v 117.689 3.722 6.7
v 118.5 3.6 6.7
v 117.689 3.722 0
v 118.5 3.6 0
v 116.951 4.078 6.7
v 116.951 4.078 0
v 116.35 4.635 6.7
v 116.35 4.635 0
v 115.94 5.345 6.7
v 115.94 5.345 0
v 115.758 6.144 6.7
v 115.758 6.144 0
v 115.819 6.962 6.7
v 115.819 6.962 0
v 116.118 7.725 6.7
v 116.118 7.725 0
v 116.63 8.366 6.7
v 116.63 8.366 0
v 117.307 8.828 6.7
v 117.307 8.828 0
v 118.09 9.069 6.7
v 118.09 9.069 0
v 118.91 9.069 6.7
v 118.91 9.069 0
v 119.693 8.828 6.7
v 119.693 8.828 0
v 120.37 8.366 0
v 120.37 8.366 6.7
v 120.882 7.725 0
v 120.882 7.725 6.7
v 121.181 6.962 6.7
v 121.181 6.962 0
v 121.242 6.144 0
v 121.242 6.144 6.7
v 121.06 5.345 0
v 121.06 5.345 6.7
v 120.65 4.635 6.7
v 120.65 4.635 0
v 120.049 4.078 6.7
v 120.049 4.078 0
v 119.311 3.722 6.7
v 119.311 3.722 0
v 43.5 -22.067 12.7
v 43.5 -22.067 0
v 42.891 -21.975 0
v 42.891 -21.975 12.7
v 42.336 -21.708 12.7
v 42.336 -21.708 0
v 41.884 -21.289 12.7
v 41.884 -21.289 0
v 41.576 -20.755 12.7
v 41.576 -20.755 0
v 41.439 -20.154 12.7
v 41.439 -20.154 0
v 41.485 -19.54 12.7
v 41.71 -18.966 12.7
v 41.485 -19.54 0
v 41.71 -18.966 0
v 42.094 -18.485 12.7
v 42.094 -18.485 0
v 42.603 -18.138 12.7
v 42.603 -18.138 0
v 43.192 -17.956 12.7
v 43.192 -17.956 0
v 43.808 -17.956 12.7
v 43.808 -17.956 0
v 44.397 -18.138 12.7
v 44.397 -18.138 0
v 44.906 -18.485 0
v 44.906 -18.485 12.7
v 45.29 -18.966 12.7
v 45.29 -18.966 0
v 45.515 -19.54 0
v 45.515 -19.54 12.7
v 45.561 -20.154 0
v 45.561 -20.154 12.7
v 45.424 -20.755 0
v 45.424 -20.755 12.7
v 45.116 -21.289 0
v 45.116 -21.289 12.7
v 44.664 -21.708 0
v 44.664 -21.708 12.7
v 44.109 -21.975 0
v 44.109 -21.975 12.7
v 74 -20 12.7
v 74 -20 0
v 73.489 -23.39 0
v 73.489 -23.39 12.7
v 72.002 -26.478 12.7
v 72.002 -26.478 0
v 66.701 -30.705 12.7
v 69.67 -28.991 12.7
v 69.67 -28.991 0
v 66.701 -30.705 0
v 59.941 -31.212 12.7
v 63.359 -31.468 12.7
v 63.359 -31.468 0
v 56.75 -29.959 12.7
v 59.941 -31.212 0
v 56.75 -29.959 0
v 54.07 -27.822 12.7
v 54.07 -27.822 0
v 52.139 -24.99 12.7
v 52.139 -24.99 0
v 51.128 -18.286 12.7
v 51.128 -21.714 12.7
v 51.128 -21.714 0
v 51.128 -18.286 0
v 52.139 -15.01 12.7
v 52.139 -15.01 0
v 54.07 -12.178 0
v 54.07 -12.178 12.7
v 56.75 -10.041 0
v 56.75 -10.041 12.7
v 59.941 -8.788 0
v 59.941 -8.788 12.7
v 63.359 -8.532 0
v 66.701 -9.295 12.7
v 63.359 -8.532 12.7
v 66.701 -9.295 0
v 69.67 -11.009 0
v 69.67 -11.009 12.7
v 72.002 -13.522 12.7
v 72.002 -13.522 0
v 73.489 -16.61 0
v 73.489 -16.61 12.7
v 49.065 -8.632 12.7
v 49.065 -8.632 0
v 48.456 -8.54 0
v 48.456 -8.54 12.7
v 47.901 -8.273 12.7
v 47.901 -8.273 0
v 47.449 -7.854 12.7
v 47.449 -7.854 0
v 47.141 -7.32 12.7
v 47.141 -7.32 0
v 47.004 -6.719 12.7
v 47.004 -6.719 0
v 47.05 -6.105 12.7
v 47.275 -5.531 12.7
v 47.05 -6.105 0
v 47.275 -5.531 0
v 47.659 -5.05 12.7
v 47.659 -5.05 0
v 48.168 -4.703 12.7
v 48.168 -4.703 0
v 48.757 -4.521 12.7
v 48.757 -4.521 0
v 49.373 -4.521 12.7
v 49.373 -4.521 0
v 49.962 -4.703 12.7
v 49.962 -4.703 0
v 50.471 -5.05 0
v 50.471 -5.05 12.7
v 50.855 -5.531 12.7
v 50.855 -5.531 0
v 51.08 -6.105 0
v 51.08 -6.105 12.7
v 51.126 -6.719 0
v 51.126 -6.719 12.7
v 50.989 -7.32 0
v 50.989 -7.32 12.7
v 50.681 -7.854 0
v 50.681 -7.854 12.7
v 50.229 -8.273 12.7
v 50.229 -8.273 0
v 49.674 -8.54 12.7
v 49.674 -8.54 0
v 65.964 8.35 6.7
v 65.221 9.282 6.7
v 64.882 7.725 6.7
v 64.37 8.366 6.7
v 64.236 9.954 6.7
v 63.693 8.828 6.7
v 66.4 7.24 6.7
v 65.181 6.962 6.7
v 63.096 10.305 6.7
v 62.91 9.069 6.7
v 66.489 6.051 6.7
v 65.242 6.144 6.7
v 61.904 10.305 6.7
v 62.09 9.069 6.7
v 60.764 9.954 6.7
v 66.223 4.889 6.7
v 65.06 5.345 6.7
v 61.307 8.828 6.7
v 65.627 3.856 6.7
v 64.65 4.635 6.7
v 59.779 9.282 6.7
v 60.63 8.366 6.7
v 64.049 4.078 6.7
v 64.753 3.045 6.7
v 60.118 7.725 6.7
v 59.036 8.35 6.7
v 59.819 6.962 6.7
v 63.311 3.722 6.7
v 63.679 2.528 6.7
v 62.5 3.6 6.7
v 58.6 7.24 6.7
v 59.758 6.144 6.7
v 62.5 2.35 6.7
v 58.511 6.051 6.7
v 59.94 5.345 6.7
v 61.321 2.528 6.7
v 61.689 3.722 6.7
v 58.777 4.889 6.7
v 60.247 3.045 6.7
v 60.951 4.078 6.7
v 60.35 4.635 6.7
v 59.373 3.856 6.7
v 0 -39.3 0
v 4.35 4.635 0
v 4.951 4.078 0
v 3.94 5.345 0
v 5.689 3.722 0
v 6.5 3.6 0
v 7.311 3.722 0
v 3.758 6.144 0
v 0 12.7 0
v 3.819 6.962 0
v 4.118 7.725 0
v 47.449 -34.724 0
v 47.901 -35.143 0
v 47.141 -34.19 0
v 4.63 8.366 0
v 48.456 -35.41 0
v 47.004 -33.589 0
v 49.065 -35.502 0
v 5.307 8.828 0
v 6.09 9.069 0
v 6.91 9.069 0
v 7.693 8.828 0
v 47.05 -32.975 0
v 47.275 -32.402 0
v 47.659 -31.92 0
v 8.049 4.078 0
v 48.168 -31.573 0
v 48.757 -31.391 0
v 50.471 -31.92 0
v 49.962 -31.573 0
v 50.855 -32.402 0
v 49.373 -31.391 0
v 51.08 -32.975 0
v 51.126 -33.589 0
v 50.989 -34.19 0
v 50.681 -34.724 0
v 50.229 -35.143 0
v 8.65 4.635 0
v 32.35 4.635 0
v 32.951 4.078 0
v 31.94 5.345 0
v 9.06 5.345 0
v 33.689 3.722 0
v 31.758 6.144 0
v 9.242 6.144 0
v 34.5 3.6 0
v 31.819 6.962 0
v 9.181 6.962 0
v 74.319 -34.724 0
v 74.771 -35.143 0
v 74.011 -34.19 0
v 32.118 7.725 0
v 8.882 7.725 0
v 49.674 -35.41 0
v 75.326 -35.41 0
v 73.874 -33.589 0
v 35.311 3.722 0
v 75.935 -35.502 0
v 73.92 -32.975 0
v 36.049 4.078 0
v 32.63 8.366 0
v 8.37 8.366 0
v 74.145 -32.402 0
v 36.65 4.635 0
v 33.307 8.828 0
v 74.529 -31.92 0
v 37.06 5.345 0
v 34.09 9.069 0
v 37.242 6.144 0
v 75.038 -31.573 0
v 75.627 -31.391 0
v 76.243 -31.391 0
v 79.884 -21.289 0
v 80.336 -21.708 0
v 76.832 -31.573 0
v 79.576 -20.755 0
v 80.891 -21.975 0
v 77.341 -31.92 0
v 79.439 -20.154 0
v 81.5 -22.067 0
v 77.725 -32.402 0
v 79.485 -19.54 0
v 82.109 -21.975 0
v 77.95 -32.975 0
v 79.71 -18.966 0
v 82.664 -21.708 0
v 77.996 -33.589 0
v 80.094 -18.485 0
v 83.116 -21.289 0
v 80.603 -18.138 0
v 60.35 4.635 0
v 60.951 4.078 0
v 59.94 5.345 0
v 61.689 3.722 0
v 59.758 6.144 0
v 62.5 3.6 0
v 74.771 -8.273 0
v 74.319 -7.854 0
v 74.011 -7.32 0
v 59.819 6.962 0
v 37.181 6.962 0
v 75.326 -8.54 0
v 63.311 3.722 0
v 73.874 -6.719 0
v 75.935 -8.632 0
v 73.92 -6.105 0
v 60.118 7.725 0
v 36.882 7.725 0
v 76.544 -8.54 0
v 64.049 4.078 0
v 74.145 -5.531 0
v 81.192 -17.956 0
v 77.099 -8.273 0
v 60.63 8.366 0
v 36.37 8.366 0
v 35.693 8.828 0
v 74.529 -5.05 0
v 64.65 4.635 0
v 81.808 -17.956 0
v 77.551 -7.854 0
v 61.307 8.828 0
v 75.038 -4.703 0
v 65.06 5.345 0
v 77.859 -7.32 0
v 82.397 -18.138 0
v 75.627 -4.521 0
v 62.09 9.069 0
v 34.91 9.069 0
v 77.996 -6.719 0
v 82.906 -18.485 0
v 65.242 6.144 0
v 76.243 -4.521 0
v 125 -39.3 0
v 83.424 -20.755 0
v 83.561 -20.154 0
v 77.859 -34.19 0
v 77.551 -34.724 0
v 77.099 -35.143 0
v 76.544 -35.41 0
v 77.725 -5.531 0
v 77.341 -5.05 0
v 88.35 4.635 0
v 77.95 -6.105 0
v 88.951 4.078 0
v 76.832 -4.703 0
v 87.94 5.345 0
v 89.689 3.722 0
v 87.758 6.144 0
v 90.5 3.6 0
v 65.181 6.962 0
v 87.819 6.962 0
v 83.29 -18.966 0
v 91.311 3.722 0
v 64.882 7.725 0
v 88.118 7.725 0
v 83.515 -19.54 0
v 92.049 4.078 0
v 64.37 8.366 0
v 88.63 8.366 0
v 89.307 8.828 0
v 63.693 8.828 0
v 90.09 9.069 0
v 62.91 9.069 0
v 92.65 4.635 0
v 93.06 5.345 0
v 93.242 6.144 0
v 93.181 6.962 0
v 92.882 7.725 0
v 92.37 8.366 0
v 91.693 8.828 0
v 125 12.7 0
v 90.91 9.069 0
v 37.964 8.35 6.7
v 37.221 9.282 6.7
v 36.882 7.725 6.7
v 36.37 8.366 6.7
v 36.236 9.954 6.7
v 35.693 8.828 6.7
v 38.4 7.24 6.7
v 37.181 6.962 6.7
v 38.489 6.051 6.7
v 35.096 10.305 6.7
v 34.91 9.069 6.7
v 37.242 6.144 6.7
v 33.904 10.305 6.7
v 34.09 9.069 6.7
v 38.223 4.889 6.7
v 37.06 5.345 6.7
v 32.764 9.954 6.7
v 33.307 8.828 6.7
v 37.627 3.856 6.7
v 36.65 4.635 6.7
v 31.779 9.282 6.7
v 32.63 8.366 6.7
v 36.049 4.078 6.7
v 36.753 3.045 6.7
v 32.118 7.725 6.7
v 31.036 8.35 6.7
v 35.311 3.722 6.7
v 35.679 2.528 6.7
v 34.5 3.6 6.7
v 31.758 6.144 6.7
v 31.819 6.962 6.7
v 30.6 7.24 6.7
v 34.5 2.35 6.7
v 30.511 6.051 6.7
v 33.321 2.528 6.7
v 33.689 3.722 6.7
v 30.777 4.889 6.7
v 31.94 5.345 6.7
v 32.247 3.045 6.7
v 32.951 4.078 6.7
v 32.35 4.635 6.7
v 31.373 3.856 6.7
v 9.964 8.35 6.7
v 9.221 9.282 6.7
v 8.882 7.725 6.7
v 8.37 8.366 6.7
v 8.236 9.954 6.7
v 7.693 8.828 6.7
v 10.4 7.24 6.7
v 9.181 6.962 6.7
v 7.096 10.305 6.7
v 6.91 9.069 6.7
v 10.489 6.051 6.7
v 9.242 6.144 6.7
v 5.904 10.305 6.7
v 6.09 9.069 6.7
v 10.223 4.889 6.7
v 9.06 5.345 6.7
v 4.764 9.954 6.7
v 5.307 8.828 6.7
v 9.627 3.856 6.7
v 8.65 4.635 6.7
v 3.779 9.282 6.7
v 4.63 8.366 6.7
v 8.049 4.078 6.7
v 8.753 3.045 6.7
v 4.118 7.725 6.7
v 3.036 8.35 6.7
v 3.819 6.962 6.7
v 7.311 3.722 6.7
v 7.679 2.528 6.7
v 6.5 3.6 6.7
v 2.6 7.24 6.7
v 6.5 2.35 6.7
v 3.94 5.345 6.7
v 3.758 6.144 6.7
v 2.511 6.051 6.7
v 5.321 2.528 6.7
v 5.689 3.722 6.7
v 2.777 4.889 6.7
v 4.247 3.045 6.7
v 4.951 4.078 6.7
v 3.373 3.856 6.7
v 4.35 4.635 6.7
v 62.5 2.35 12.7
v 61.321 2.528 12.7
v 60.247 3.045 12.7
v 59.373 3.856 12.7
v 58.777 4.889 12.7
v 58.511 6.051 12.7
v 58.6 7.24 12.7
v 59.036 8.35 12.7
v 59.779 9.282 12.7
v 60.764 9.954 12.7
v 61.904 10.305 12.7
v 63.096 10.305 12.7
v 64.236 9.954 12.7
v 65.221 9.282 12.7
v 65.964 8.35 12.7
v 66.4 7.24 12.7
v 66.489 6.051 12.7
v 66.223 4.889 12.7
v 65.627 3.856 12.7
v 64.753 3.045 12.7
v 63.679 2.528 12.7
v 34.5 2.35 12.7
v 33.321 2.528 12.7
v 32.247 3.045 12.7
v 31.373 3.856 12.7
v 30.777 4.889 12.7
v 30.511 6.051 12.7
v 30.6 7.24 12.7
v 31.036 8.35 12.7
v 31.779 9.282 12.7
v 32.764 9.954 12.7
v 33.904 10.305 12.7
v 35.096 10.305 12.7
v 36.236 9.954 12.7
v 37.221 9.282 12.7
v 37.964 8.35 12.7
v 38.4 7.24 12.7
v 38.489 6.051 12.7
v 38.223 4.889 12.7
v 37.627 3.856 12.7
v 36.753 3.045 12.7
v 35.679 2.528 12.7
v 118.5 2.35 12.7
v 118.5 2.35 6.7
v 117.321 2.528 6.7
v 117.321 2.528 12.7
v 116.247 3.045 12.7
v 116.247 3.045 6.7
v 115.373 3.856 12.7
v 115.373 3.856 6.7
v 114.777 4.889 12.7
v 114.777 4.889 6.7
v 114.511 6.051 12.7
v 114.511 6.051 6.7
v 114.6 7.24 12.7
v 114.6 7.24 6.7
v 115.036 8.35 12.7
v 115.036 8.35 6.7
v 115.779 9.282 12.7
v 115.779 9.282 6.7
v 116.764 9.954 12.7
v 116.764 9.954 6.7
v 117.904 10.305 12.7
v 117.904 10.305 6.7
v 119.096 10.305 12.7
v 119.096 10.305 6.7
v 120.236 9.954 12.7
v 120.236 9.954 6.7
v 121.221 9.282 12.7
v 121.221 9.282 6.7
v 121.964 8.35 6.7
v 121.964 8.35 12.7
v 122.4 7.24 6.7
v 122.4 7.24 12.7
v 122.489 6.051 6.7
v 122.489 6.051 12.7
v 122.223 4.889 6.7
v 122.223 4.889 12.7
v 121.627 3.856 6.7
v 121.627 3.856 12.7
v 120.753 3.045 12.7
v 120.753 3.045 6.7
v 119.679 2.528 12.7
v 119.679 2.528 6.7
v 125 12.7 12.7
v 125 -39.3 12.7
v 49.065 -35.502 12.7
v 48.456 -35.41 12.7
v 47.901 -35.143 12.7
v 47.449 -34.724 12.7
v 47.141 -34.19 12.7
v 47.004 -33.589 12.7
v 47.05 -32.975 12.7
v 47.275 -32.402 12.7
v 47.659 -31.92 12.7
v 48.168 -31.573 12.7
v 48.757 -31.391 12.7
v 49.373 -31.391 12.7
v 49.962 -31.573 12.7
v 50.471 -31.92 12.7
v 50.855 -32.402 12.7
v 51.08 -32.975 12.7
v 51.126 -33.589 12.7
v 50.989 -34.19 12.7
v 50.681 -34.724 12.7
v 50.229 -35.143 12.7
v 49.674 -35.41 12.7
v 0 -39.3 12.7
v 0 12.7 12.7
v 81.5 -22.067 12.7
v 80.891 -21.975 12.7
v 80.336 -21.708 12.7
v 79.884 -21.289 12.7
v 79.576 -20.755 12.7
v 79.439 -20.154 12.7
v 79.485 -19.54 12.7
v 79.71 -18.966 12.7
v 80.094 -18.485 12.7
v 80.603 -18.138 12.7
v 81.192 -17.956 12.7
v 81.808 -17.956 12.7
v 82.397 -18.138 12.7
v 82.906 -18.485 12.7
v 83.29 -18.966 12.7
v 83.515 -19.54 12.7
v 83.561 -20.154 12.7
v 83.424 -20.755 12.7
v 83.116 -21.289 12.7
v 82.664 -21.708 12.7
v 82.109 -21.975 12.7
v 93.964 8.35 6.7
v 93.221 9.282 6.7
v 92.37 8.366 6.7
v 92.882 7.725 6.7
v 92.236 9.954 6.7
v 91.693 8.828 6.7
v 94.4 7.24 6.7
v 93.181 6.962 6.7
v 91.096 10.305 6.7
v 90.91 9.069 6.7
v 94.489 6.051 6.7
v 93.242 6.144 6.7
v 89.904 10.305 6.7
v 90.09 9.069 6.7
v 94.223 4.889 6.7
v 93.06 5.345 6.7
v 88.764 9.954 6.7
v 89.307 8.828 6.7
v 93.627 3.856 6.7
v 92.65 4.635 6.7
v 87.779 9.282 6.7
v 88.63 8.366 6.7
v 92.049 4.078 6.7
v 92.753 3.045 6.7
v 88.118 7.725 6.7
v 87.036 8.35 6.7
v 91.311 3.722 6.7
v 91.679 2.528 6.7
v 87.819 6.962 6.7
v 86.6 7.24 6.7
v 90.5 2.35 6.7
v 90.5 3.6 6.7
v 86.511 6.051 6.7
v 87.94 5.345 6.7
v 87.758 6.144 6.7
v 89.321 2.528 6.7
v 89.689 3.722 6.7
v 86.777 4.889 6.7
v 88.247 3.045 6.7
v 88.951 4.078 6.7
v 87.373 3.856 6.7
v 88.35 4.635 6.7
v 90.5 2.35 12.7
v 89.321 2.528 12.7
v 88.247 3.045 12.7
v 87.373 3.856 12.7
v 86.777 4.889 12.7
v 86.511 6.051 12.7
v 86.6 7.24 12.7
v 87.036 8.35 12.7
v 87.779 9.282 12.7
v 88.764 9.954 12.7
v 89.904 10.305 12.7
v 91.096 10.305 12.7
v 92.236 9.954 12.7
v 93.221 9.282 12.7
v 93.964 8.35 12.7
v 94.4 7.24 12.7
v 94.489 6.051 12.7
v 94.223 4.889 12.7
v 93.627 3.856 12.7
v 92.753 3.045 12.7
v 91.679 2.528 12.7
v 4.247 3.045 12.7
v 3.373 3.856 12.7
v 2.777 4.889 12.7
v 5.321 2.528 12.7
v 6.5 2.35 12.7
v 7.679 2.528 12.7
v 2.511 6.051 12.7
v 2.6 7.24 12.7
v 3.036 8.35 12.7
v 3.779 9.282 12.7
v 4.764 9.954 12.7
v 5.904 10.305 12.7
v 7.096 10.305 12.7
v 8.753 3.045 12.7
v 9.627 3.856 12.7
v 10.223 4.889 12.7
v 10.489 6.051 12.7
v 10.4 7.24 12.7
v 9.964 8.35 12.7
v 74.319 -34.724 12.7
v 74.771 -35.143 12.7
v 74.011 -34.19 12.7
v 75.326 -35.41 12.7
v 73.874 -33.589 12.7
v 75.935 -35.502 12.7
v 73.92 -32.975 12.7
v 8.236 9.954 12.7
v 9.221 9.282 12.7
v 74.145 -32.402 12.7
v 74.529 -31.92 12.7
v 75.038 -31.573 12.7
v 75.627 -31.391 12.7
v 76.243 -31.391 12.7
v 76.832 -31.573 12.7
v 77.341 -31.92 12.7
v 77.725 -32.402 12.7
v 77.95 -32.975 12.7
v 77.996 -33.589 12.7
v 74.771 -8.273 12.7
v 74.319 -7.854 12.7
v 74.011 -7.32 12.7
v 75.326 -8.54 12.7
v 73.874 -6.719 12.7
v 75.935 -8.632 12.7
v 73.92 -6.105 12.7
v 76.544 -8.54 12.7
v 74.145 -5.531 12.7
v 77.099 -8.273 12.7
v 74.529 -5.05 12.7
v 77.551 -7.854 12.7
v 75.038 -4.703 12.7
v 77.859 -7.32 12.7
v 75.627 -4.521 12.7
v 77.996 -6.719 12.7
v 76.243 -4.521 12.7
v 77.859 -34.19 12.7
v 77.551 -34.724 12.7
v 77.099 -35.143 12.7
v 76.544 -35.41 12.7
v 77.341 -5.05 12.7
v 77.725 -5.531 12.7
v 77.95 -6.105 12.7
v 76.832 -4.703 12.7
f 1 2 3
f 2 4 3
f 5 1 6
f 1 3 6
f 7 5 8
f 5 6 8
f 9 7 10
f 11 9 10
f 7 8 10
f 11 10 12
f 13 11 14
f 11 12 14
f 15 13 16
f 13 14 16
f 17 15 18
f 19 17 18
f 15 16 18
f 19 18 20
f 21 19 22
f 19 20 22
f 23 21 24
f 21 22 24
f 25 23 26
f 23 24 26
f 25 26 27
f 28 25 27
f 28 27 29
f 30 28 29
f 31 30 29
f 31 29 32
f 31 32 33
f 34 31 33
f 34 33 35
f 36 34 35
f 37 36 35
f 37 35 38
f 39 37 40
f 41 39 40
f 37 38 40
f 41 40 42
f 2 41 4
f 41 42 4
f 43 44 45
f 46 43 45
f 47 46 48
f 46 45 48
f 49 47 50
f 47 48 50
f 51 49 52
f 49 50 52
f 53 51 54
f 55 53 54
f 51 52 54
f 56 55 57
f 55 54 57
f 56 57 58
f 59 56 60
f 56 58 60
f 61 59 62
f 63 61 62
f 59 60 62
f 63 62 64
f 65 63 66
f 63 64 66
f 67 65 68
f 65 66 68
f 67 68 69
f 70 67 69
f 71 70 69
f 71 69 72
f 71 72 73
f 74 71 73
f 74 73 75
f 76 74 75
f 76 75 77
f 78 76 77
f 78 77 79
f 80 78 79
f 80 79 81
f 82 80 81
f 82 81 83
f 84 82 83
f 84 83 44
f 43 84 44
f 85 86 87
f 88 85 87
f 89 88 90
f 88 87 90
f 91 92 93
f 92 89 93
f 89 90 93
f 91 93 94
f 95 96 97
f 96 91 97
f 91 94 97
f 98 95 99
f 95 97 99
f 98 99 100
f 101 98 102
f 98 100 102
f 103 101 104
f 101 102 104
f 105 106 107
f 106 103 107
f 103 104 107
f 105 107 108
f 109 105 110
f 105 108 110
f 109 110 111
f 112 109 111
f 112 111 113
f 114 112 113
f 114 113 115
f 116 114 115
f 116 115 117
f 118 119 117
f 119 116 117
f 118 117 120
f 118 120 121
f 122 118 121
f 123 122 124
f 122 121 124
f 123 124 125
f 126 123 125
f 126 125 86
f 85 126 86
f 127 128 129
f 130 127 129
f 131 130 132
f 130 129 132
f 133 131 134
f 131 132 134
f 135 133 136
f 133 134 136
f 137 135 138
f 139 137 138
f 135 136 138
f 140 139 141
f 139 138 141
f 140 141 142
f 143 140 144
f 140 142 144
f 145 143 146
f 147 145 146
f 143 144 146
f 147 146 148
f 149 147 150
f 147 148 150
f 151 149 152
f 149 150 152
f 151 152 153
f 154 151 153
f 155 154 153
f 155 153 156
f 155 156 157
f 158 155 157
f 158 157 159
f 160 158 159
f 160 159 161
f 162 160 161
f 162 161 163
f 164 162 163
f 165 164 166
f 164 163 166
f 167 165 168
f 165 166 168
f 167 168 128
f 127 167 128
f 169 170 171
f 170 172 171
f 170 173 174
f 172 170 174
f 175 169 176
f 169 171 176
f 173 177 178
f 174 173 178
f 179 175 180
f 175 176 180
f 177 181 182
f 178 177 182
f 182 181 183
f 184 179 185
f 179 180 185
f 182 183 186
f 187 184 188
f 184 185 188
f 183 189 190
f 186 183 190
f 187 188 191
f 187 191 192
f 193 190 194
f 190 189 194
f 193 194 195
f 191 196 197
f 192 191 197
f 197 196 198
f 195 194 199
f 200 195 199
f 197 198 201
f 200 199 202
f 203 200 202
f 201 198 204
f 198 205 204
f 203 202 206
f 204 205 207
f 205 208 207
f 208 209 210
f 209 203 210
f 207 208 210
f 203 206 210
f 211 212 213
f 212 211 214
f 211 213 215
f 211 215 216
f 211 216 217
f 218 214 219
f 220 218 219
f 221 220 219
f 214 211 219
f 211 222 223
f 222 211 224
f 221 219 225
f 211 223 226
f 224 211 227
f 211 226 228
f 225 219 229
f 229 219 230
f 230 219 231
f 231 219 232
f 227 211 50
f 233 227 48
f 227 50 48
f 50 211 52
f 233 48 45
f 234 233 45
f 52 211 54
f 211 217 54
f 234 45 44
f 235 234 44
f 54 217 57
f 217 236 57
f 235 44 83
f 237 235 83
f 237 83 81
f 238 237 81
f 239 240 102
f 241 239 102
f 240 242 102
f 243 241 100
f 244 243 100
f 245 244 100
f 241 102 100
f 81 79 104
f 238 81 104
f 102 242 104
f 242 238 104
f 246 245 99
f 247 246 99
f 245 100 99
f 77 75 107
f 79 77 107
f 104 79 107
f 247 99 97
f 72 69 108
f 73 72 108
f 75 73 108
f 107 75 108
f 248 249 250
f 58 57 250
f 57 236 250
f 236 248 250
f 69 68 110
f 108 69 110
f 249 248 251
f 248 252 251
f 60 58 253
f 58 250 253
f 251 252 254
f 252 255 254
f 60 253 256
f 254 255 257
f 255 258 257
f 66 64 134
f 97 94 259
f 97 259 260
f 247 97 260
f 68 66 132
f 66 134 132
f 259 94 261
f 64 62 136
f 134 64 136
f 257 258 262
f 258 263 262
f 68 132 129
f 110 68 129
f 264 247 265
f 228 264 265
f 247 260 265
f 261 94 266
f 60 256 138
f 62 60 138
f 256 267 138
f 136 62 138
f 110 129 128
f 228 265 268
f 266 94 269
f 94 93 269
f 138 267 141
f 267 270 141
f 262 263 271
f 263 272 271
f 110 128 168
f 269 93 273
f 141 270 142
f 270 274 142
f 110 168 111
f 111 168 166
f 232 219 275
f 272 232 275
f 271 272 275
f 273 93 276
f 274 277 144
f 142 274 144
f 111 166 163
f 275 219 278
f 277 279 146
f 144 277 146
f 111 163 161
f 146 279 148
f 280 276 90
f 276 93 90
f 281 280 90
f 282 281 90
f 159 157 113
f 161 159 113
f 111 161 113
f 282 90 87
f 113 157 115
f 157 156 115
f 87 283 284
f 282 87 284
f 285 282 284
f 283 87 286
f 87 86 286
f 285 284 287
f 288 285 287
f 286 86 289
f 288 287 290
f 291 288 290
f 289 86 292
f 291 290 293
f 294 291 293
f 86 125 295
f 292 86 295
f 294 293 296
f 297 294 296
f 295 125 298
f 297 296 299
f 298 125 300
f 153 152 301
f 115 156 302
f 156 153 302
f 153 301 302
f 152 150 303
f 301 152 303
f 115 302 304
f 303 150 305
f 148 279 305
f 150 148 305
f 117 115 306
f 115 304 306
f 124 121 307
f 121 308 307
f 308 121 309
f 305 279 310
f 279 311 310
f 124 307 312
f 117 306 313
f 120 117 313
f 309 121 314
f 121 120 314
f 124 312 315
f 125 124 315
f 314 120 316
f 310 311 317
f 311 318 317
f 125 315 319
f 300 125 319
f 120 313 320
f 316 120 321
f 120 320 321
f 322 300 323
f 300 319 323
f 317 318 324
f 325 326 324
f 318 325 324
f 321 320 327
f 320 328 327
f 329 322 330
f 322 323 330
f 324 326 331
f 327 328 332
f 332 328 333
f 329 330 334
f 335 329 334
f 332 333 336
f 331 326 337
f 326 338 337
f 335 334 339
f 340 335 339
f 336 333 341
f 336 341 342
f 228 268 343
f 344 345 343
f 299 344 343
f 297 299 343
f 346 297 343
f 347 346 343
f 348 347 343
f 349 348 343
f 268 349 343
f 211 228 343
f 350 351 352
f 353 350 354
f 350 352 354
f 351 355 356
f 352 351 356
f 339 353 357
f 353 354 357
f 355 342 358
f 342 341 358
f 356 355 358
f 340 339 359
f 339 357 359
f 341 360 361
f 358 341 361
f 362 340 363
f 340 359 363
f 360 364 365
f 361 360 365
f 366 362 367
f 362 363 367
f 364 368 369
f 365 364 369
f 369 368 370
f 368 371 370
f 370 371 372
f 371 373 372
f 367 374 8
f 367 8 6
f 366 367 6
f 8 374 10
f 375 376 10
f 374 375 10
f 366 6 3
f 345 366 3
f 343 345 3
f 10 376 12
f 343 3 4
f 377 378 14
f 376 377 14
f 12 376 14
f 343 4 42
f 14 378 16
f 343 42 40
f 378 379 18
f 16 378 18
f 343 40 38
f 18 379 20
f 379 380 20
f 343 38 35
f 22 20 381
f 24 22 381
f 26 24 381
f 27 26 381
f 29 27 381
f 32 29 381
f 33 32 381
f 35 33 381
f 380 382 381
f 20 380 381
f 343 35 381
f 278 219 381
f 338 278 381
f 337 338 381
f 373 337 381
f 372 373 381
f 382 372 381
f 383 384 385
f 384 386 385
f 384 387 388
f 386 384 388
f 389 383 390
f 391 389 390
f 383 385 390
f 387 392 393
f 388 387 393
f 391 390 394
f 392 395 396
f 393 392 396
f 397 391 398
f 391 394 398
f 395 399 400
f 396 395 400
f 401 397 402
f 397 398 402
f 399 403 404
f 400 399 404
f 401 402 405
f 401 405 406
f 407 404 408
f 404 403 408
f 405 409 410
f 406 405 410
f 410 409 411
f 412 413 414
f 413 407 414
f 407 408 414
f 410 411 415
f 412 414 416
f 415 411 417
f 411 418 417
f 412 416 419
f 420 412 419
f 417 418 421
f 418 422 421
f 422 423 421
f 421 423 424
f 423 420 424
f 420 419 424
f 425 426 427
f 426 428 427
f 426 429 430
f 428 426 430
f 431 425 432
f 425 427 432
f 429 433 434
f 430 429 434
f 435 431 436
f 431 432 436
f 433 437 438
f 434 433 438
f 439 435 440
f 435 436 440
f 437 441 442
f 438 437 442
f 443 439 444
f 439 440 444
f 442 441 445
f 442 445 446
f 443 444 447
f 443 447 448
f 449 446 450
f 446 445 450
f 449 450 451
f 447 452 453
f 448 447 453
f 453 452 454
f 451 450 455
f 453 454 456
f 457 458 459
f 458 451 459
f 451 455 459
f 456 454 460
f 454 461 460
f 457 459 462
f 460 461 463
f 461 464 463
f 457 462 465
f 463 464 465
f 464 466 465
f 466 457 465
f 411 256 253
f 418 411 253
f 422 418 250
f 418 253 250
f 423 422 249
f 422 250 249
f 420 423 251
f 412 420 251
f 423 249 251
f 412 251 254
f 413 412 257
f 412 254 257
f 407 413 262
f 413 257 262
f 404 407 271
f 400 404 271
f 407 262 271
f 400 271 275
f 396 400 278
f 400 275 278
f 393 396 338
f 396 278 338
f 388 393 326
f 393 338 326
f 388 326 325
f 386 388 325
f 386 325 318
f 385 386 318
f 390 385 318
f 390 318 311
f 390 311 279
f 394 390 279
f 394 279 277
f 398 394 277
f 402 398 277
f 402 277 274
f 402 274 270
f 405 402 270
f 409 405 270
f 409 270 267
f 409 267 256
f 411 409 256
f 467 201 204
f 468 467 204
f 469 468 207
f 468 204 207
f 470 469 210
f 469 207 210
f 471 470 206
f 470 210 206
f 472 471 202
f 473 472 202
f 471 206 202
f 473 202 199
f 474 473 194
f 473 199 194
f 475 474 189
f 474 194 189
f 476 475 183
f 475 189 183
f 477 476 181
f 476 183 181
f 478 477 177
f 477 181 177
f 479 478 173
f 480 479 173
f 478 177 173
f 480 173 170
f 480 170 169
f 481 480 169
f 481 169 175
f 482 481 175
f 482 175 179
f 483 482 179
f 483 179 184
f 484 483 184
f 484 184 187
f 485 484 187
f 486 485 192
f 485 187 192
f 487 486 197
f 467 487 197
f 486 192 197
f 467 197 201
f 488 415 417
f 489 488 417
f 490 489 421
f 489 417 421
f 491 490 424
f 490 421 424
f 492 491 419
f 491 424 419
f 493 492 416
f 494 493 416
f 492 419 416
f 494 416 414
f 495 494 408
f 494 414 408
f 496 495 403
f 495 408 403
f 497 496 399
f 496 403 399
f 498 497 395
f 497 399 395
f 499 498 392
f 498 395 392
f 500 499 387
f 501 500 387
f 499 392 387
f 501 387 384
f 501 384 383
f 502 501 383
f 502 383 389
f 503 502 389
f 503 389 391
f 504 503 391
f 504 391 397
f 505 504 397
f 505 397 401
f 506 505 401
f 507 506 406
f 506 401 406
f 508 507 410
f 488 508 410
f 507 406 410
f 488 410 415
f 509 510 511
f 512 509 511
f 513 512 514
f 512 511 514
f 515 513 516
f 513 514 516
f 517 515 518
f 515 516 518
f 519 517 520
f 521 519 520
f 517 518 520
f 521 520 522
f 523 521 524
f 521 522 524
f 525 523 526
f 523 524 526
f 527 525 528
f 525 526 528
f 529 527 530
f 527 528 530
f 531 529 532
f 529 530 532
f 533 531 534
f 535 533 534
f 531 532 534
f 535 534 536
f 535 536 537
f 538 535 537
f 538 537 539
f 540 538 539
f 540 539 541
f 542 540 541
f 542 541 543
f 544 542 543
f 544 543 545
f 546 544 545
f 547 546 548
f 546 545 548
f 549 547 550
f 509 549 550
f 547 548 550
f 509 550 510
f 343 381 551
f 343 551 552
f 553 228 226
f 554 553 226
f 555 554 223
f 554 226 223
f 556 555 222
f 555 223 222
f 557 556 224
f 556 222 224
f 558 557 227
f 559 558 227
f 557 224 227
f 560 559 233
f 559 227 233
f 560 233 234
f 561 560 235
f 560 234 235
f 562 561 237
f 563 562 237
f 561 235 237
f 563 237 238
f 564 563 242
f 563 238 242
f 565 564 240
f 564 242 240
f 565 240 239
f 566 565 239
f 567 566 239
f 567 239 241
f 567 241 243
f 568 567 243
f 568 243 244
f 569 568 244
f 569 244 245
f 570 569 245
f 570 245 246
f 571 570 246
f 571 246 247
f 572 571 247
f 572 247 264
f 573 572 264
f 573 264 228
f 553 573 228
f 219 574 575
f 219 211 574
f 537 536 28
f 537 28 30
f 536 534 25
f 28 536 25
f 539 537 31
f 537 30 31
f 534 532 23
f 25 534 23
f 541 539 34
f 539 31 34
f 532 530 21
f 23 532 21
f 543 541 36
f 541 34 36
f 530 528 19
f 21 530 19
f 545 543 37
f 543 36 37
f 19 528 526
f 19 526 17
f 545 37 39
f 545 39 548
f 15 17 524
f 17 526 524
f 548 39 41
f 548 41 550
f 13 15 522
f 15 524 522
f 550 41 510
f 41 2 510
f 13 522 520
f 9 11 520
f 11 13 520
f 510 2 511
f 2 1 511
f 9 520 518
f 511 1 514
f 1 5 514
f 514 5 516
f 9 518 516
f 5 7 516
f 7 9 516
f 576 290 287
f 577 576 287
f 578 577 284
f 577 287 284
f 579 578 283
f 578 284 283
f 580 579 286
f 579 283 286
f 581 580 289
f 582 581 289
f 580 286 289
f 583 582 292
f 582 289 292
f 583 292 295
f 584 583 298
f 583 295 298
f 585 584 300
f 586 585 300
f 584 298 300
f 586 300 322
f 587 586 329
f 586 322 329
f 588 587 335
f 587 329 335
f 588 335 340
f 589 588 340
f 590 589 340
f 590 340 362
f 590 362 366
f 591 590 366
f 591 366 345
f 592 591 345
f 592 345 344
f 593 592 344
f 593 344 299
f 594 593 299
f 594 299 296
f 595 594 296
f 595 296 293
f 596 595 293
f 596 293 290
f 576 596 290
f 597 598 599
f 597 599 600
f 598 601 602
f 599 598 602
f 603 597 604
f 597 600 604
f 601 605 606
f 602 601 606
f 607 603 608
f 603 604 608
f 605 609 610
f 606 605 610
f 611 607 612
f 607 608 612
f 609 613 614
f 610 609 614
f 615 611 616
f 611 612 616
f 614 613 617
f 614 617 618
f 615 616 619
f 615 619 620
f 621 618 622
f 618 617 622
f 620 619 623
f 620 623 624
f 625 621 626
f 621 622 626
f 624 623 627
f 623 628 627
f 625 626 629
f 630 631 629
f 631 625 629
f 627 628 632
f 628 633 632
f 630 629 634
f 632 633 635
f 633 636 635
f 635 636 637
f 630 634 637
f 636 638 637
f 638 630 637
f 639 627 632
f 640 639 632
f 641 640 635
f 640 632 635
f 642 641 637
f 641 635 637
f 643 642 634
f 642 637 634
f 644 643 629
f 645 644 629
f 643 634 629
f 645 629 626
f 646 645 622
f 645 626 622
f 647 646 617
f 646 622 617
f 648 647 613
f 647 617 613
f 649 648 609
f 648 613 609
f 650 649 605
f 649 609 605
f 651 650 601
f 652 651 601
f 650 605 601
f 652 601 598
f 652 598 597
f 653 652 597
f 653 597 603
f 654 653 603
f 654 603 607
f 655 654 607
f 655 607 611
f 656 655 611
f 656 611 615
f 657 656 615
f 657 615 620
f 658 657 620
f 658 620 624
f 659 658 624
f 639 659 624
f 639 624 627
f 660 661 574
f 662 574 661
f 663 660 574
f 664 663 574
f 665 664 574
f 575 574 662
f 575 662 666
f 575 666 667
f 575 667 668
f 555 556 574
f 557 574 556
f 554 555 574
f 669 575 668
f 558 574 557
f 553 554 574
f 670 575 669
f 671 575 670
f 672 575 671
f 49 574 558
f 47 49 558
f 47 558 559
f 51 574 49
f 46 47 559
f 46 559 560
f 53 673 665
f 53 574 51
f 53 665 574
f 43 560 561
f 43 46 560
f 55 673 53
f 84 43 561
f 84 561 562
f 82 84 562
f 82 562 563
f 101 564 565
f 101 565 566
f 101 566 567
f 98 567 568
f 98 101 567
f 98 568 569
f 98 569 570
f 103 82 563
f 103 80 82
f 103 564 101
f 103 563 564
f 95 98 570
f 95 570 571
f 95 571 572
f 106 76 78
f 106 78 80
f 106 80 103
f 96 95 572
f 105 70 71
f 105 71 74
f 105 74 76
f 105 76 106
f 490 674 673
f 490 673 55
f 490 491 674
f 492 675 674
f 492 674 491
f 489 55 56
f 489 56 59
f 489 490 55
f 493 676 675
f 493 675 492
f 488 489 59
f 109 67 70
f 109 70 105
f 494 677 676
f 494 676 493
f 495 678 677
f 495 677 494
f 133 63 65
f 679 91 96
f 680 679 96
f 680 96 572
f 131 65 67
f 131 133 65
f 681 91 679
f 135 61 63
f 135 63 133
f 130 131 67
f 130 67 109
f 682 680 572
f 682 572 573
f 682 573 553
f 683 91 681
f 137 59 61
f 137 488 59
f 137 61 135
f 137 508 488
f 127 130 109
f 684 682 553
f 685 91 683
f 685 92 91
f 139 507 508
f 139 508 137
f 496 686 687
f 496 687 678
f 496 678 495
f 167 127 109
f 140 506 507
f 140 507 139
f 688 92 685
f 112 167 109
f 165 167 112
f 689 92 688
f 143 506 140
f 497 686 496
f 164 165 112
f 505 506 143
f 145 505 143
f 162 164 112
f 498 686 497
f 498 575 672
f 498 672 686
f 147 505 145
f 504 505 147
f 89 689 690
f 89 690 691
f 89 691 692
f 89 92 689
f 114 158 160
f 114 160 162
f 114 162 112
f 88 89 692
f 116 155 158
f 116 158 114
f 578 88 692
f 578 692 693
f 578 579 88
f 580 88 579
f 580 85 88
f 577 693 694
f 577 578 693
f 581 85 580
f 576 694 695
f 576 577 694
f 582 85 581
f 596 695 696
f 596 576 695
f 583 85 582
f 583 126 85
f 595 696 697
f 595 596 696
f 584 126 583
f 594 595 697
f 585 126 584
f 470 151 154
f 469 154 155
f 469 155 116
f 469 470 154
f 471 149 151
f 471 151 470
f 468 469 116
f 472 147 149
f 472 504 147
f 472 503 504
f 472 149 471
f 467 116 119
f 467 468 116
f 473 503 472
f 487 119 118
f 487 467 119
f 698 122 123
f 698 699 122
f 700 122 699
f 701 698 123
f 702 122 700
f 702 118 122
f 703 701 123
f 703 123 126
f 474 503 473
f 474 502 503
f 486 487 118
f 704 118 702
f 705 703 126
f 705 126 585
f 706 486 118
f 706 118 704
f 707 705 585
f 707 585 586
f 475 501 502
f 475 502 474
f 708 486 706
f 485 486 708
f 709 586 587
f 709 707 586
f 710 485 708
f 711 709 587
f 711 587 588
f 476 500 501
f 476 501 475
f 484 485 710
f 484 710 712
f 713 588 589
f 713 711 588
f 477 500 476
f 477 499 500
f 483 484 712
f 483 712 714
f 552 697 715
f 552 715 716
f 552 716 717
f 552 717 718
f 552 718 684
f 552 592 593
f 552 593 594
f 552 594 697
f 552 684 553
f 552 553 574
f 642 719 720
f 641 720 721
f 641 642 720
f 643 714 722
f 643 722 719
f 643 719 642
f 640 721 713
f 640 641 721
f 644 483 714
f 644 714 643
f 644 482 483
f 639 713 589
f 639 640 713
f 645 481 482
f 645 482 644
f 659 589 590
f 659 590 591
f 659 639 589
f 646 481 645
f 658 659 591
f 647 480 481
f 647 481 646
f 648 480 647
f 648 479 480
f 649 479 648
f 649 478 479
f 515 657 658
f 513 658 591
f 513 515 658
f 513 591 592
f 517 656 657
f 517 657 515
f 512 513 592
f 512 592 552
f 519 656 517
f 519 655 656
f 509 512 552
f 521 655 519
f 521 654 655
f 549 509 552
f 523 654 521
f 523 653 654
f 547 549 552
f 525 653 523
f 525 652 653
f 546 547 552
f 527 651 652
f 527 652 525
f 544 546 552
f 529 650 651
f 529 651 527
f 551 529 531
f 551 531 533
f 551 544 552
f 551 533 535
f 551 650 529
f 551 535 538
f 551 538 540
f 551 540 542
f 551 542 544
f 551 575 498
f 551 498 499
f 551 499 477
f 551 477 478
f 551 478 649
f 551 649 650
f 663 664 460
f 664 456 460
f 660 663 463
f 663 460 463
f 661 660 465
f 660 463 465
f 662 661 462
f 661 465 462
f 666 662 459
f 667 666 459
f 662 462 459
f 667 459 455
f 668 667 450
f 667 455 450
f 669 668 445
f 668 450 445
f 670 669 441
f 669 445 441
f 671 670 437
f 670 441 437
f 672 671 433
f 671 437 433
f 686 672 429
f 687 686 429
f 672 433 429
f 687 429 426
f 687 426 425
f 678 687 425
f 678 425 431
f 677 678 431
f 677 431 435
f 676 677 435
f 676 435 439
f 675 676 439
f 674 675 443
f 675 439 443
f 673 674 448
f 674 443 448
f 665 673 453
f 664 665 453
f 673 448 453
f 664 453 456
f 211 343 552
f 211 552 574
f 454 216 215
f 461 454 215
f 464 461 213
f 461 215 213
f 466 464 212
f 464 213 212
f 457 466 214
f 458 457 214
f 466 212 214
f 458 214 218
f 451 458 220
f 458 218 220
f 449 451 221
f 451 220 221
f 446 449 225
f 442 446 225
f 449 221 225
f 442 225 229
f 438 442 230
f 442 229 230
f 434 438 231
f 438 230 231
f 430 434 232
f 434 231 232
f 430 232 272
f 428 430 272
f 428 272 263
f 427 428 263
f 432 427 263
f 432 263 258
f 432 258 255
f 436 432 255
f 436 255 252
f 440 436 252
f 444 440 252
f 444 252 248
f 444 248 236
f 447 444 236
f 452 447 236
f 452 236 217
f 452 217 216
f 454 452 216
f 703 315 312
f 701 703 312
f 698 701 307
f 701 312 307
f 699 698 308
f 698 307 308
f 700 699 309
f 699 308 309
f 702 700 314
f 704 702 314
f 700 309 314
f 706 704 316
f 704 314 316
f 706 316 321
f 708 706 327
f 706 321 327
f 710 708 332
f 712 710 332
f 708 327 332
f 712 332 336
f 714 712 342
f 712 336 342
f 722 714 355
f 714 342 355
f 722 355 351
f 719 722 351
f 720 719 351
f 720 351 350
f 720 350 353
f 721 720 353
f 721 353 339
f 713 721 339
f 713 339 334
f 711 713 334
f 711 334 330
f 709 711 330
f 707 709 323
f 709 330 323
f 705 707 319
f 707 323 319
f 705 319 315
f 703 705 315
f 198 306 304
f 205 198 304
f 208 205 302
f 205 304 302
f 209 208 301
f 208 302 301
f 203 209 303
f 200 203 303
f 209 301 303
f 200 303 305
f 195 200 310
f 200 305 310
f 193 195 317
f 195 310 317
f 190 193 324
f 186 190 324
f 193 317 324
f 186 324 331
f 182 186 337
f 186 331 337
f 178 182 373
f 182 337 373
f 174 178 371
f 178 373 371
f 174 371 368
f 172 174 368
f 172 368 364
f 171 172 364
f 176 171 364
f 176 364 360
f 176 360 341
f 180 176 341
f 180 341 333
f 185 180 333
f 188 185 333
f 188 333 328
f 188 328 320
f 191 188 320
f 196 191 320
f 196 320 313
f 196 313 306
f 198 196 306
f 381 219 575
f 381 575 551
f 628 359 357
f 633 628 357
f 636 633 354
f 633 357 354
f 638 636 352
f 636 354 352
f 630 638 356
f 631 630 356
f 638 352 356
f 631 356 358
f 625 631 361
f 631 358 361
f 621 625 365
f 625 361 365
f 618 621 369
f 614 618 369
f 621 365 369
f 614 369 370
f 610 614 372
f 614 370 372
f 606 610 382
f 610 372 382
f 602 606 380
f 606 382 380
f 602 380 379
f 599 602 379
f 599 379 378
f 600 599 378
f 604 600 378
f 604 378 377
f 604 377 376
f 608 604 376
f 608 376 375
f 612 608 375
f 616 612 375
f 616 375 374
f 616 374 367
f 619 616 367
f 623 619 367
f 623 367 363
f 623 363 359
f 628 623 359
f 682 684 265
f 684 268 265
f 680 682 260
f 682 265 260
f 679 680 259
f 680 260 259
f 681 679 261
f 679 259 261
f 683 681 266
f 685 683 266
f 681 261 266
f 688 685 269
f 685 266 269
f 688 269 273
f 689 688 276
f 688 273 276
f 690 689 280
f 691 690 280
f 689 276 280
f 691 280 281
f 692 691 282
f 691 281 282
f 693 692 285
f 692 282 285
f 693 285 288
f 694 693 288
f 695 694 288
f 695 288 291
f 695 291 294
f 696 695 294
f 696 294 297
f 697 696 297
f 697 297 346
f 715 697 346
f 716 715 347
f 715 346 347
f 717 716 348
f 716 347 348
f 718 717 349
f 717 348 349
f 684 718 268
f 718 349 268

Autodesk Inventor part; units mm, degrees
ref_plane "YZ Plane" through (0, 0, 0) normal (1, 0, 0) x (0, 1, 0)
ref_plane "XZ Plane" through (0, 0, 0) normal (0, 1, 0) x (-1, 0, 0)
ref_plane "XY Plane" through (0, 0, 0) normal (0, 0, 1) x (1, 0, 0)
sketch "Esboço1" plane through (0, 0, 0) normal (0, 0, 1) x (1, 0, 0)
  line L0 (0, 12.7) -> (125, 12.7)
  line L1 (125, 12.7) -> (125, -39.3)
  line L2 (125, -39.3) -> (0, -39.3)
  line L3 (0, -39.3) -> (0, 12.7)
  circle A0 centre (62.5, -20) radius 11.5
  dimension "d0" = 52
  dimension "d1" = 23
  dimension "d2" = 125
extrude "Extrusão1" add sketch "Esboço1" along normal blind 12.7
sketch "Esboço3" plane through (0, 0, 12.7) normal (0, 0, 1) x (1, 0, 0)
  circle A0 centre (75.935, -33.435) radius 2.75 construction
  circle A1 centre (49.065, -33.435) radius 2.75 construction
  circle A2 centre (81.5, -20) radius 2.75 construction
  circle A3 centre (43.5, -20) radius 2.75 construction
  circle A4 centre (49.065, -6.565) radius 2.75 construction
  circle A5 centre (75.935, -6.565) radius 2.75 construction
  point P0 (0, 0)
hole "Furo2" at (75.935, -33.435, 12.7) at (49.065, -33.435, 12.7) at (81.5, -20, 12.7) at (43.5, -20, 12.7) at (49.065, -6.565, 12.7) at (75.935, -6.565, 12.7) direction (0, 0, -1) diameter 4.134 end through all thread size "M5x0.8" class "6H" standard "ANSI Metric M Profile"
sketch "Esboço5" plane through (0, 0, 12.7) normal (0, 0, 1) x (1, 0, 0)
  circle A0 centre (6.5, 6.35) radius 2.067
  circle A1 centre (34.5, 6.35) radius 2.067
  circle A2 centre (62.5, 6.35) radius 2.067
  circle A3 centre (90.5, 6.35) radius 2.067
  circle A4 centre (118.5, 6.35) radius 2.067
  point P0 (0, 0)
hole "Furo3" at (6.5, 6.35, 12.7) at (34.5, 6.35, 12.7) at (62.5, 6.35, 12.7) at (90.5, 6.35, 12.7) at (118.5, 6.35, 12.7) direction (0, 0, -1) diameter 5.5 end through all counterbore diameter 8 counterbore depth 6
properties part number "CHAPA_APOIO_CASTANHA_EIXO_Z"
